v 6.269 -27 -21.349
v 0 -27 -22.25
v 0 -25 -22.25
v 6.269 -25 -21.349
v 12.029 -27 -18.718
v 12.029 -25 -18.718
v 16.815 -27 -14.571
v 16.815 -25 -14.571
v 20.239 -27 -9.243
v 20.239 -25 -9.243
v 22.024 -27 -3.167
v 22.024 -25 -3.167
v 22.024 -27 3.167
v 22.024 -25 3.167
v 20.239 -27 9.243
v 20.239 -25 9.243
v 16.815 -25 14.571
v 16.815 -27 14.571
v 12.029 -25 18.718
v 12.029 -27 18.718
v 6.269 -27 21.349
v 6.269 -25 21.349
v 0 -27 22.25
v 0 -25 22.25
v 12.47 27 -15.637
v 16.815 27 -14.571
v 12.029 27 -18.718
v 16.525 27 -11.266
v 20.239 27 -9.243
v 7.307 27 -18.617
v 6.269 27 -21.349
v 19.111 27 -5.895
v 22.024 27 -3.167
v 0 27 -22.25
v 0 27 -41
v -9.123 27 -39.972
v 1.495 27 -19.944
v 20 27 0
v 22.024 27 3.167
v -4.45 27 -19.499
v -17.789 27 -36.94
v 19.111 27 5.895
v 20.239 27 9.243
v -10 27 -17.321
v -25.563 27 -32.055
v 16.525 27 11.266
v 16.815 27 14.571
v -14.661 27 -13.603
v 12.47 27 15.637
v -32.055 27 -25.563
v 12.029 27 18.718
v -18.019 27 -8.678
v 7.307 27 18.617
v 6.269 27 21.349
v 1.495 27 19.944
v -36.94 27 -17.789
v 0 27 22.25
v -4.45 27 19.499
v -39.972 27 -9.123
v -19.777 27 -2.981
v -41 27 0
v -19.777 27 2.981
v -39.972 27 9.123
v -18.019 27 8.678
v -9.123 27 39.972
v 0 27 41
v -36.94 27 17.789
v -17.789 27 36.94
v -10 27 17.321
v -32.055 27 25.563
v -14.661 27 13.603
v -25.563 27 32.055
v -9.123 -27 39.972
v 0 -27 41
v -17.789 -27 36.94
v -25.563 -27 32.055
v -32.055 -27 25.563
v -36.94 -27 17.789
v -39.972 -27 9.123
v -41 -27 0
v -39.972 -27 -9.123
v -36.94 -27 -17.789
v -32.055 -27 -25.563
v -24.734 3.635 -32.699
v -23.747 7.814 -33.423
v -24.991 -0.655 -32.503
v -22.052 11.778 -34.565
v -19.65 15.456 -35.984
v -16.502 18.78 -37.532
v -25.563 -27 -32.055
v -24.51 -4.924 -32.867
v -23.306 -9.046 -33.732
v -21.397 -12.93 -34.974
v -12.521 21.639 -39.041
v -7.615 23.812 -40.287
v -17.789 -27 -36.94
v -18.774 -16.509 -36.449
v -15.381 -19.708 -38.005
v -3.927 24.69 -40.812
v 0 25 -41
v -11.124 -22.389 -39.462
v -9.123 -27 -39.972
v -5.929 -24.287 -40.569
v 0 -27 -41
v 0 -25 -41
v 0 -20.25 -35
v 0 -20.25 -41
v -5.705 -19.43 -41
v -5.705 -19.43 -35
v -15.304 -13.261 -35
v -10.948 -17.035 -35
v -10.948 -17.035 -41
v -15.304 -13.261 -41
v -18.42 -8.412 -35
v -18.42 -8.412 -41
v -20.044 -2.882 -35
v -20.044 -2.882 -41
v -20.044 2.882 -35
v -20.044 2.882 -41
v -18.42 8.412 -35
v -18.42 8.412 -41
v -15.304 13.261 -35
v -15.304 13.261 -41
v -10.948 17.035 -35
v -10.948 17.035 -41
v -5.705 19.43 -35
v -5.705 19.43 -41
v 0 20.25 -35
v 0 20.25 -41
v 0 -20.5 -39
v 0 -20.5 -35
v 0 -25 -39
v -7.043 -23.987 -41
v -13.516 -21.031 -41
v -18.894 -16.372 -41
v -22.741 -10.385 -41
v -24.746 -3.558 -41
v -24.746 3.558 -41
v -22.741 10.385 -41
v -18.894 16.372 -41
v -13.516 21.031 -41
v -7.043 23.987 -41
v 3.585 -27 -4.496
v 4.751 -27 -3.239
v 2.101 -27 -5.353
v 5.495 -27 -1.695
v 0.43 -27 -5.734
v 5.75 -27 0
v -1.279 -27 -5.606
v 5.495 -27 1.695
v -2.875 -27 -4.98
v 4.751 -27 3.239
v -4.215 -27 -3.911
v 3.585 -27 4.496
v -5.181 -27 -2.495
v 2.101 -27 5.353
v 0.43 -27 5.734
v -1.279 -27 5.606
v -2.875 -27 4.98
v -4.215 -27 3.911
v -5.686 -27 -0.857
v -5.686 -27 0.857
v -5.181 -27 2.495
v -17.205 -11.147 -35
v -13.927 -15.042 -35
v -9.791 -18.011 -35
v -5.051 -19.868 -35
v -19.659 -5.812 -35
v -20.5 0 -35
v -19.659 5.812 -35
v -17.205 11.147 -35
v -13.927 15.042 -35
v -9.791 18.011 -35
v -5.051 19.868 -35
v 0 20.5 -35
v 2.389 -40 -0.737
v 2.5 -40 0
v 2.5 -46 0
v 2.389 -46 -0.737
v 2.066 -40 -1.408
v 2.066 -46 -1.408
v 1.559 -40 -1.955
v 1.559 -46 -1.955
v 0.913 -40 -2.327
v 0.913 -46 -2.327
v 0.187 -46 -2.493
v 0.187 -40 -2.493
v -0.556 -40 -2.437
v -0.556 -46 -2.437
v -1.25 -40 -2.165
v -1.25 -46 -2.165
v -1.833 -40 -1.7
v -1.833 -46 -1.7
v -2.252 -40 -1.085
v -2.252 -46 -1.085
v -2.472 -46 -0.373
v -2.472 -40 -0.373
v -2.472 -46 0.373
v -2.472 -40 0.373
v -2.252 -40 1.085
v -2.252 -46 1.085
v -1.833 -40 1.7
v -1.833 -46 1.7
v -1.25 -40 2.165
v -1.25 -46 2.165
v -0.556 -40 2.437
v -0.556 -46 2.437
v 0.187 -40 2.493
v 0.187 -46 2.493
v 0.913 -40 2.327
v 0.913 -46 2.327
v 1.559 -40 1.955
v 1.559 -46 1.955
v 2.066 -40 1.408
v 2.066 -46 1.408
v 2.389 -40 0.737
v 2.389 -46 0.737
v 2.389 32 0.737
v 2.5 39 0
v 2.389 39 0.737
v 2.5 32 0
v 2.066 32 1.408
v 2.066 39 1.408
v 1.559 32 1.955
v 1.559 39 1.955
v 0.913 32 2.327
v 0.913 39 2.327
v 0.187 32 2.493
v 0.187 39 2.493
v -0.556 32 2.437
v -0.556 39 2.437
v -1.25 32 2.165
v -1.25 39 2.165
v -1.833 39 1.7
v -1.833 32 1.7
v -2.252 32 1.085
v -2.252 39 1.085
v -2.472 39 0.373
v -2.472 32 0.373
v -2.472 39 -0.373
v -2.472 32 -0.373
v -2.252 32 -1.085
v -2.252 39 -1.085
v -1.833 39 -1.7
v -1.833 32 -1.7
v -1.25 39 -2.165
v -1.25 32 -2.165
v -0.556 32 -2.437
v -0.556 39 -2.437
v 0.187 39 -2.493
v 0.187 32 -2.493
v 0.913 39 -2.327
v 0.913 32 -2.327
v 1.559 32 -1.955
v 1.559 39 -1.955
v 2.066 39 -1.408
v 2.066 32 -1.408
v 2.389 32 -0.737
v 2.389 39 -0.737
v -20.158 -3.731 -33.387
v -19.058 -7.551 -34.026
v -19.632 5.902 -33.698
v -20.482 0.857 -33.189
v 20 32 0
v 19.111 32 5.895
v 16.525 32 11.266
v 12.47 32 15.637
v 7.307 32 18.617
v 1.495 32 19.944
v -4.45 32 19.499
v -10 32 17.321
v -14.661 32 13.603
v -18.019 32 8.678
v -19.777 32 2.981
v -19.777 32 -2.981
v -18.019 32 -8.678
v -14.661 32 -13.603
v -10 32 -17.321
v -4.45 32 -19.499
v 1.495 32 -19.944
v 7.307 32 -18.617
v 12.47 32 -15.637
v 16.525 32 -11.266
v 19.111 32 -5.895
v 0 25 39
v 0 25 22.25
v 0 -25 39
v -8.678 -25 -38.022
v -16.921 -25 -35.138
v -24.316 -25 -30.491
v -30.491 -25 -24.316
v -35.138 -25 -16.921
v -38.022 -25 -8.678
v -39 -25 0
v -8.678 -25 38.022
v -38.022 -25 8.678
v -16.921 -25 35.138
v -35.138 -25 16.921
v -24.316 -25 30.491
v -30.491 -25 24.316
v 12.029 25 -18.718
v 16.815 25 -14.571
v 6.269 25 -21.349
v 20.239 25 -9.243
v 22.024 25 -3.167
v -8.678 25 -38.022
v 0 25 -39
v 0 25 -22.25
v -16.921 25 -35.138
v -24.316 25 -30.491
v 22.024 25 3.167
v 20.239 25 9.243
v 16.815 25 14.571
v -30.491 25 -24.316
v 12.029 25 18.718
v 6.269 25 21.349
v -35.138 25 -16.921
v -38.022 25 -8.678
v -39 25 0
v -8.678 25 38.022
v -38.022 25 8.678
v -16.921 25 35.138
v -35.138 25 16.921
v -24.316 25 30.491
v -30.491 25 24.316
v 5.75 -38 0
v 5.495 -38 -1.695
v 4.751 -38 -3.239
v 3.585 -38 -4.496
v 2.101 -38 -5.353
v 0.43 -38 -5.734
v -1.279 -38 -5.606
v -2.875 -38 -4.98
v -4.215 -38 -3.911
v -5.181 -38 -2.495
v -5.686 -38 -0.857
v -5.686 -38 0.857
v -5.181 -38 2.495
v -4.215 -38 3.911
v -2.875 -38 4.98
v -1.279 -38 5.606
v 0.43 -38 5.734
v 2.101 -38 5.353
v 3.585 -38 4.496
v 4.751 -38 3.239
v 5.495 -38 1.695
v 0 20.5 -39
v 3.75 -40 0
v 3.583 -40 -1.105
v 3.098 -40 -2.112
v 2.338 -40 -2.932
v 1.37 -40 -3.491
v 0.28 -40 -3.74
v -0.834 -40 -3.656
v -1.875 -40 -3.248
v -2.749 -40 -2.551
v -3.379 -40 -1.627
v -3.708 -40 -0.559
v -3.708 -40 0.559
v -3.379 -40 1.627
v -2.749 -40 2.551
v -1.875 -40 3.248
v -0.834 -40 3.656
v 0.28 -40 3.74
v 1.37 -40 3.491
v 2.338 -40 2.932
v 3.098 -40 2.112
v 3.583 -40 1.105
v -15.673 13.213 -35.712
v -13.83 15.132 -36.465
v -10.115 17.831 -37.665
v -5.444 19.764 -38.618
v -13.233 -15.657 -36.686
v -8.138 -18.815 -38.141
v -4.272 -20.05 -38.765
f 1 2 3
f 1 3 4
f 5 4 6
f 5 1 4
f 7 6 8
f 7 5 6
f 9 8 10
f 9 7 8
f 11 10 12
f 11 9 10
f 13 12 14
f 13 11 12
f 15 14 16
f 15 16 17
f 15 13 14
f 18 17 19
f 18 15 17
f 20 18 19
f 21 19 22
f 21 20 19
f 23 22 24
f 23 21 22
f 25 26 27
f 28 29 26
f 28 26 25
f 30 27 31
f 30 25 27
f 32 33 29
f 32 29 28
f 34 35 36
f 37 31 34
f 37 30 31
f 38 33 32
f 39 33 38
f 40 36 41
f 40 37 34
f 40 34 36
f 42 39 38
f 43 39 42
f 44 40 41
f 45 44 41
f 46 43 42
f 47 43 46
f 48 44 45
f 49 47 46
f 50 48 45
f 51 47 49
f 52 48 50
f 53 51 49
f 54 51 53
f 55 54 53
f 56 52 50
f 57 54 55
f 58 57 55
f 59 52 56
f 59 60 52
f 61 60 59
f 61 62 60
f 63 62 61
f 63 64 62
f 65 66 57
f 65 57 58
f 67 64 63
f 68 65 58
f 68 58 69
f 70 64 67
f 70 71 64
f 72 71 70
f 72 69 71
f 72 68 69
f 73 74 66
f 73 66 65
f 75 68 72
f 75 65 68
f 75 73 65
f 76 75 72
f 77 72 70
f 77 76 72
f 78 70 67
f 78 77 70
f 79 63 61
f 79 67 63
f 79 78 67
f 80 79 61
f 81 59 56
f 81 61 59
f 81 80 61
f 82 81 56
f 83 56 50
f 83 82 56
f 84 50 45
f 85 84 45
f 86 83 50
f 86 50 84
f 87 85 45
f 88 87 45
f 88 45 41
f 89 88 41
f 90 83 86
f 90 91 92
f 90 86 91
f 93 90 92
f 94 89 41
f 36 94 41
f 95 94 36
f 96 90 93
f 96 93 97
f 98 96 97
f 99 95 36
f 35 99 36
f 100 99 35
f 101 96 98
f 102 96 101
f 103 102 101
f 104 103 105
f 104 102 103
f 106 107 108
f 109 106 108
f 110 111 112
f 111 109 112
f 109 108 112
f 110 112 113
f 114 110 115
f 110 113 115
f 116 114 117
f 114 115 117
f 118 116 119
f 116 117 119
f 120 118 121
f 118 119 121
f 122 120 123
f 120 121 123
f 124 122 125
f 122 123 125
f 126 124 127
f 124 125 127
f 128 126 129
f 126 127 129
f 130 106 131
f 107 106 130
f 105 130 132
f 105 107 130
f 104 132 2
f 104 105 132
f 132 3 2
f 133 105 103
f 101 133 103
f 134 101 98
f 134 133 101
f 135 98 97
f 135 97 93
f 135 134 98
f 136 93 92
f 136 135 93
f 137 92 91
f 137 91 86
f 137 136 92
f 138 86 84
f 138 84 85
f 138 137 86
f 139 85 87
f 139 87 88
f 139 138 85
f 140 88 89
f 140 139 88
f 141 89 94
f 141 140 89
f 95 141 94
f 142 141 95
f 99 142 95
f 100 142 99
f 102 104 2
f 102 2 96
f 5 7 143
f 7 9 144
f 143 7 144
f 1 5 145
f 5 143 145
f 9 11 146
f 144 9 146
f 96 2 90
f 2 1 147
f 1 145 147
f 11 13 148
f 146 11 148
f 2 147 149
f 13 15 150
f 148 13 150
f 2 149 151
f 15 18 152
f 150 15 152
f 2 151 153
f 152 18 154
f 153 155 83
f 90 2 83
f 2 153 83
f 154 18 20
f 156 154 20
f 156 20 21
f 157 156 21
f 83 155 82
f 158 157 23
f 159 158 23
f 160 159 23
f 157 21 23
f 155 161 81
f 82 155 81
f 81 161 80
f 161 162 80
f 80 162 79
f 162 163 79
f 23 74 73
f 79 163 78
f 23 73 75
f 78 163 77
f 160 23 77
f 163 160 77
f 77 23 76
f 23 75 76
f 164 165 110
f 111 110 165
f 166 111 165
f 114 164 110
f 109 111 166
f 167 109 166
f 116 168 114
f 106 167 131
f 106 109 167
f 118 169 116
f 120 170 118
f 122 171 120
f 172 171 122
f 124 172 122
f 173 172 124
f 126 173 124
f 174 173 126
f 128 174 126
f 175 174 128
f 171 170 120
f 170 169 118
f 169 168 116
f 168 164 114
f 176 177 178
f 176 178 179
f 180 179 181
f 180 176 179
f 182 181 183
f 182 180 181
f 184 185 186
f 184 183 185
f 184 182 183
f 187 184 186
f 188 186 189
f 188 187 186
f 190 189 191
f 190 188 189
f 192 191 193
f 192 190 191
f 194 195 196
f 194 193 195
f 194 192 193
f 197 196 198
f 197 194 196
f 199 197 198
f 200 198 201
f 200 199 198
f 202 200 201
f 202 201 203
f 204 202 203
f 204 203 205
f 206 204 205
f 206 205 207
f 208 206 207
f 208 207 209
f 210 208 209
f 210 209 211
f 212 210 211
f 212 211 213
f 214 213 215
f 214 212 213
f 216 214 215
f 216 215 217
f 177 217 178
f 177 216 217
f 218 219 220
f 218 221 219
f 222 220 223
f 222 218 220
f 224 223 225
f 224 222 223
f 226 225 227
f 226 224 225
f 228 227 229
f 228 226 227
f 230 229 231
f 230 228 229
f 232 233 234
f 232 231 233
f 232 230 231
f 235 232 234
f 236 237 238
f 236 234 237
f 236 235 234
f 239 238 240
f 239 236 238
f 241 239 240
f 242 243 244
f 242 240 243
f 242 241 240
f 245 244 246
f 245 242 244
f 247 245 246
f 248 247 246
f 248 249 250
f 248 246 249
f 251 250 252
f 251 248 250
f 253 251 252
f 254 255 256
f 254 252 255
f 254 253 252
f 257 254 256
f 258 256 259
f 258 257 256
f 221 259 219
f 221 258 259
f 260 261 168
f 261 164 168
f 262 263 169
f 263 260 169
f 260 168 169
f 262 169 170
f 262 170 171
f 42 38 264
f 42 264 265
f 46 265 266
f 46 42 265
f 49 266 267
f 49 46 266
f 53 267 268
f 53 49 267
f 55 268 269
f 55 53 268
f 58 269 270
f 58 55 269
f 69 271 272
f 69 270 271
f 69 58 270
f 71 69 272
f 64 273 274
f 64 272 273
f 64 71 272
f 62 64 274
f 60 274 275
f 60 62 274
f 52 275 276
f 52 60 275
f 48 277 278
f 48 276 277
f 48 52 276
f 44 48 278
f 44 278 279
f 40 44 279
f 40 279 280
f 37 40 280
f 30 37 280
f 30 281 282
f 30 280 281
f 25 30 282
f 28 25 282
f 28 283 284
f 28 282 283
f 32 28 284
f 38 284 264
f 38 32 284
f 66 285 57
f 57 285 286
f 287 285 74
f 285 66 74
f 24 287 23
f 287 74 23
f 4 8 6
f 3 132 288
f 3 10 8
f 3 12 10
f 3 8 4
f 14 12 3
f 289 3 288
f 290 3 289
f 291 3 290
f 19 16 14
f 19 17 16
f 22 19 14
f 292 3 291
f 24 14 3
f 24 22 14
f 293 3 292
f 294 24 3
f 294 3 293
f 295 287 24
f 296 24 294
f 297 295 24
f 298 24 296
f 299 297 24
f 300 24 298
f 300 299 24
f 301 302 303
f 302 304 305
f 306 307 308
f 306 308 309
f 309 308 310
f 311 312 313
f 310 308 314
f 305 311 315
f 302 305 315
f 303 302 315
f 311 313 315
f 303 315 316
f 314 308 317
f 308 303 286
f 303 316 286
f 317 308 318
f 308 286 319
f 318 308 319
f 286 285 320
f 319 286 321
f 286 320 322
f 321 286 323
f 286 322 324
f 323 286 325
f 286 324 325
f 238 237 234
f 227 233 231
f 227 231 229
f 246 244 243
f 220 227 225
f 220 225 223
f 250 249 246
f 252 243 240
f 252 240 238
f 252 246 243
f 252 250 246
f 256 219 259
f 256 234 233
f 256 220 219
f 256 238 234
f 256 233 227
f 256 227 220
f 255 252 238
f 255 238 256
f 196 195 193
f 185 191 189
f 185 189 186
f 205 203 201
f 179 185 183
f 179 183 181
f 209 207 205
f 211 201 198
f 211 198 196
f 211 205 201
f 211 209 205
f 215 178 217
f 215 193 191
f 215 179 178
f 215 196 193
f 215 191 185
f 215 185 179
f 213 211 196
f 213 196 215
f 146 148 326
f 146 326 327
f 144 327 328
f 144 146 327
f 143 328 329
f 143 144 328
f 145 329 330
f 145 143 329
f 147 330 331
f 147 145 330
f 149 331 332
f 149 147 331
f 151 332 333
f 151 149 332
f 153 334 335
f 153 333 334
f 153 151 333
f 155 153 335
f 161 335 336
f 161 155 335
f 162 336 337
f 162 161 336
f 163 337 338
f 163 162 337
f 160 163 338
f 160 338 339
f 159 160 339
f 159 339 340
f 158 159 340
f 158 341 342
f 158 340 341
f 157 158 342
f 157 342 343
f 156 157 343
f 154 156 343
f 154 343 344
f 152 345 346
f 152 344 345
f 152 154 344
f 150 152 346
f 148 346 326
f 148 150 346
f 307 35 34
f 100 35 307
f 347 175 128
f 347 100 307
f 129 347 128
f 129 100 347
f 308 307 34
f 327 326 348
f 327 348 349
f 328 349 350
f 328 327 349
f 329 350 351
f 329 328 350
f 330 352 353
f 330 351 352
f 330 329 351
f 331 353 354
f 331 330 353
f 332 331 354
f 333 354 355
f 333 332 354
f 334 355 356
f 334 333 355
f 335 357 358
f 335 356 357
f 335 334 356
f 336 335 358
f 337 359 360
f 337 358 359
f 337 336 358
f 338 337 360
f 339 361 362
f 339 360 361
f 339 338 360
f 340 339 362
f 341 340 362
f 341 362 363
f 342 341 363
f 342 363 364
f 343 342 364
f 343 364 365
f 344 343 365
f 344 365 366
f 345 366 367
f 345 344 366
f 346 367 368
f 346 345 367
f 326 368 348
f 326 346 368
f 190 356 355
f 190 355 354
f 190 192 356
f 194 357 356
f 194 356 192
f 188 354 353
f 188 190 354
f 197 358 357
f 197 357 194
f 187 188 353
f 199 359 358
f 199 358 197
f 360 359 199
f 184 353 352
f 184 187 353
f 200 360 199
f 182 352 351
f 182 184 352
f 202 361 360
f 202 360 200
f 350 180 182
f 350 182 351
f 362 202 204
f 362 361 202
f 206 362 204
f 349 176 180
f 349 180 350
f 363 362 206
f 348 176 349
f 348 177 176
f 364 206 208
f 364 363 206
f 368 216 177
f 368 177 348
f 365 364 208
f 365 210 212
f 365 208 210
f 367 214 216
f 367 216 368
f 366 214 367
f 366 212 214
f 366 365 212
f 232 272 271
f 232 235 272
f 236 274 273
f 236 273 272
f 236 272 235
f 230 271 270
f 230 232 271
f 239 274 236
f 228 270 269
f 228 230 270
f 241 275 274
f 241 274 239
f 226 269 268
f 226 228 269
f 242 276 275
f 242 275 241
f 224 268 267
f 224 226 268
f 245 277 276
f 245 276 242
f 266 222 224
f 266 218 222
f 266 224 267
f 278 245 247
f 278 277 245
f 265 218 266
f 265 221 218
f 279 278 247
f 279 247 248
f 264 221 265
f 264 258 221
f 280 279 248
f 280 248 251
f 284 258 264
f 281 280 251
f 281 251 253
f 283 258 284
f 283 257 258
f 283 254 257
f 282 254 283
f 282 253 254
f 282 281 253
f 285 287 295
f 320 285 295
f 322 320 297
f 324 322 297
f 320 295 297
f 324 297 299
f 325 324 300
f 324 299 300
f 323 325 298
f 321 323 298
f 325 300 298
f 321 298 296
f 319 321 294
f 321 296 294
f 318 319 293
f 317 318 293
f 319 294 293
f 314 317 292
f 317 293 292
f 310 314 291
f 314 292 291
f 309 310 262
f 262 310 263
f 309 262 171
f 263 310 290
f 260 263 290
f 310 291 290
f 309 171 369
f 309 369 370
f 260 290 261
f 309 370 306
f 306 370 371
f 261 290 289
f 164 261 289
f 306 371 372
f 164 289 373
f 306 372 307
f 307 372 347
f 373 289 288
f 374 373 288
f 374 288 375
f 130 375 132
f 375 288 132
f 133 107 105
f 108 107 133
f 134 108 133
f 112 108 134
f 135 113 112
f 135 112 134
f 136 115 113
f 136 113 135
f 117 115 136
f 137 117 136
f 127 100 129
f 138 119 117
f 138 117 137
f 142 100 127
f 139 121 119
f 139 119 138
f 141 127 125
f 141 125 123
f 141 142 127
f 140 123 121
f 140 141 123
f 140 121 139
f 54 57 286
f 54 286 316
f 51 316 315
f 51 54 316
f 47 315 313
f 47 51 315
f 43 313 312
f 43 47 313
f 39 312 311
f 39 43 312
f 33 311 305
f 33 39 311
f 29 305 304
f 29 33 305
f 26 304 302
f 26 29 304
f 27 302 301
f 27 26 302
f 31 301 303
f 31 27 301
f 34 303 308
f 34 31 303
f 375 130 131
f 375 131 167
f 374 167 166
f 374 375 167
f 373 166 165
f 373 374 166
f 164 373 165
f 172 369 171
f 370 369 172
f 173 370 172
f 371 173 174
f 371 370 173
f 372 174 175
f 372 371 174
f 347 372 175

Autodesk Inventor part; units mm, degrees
ref_plane "YZ Plane" through (0, 0, 0) normal (1, 0, 0) x (0, 1, 0)
sketch "스케치1" plane through (0, 0, 0) normal (0, 1, 0) x (-1, 0, 0)
  arc A0 (0, -41) -> (0, 41) centre (0, 0) ccw
  line L0 (0, 41) -> (0, -41)
  dimension "d0" = 82
extrude "돌출1" add sketch "스케치1" along normal mid plane 54
shell "쉘1" thickness 2 removed faces 1 at (0, 9, -13.6667)
sketch "스케치3" plane through (0, 27, 0) normal (0, 1, 0) x (1, 0, 0)
  circle A0 centre (0, 0) radius 22.25
  line L0 (0, 41) -> (0, -41) projected
  line L1 (0, -22.25) -> (0, 22.25)
  dimension "d4" = 44.5
extrude "돌출2" add sketch "스케치3" against normal blind 2 contours A0 L0 picked at (7.4489, 4.8102)
mirror "미러1" about plane through (0, 0, 0) normal (0, 1, 0) of "돌출2"
sketch "스케치4" plane through (0, 27, 0) normal (0, 1, 0) x (1, 0, 0)
  circle A0 centre (0, 0) radius 20
  dimension "d7" = 40
extrude "돌출3" add sketch "스케치4" along normal blind 5
sketch "스케치5" plane through (0, 32, 0) normal (0, 1, 0) x (1, 0, 0)
  circle A0 centre (0, 0) radius 2.5
  dimension "d10" = 5
extrude "돌출4" add sketch "스케치5" along normal blind 7
sketch "스케치6" plane through (0, -27, 0) normal (0, -1, 0) x (1, 0, 0)
  circle A0 centre (0, 0) radius 5.75
  dimension "d13" = 11.5
extrude "돌출5" add sketch "스케치6" along normal blind 13
sketch "스케치7" plane through (0, -40, 0) normal (0, -1, 0) x (1, 0, 0)
  circle A0 centre (0, 0) radius 2.5
  dimension "d16" = 5
extrude "돌출6" add sketch "스케치7" along normal blind 6
chamfer "모따기1" distance 2 angle 45 1 edges at (-5.75, -40, 0)
ref_plane "작업 평면1" through (0, 0, -41) normal (0, 0, 1) x (1, 0, 0)
sketch "스케치8" plane through (0, 0, -41) normal (0, 0, 1) x (1, 0, 0)
  circle A0 centre (0, 0) radius 20.5
  dimension "d23" = 41
extrude "돌출7" cut sketch "스케치8" along normal up to surface
ref_plane "작업 평면2" through (0, 0, -41) normal (0, 0, 1) x (1, 0, 0)
sketch "스케치9" plane through (0, 0, -41) normal (0, 0, 1) x (1, 0, 0)
  circle A0 centre (0, 0) radius 20.5
  line L0 (0, 25) -> (0, 20.5) projected
  line L1 (0, 20.5) -> (0, -20.5)
  dimension "d27" = 41
extrude "돌출8" add sketch "스케치9" along normal blind 6 contours L1 A0 picked at (-6.7835, -0.8237)
sketch "스케치10" plane through (0, 0, -41) normal (0, 0, -1) x (-1, 0, 0)
  circle A0 centre (0, 0) radius 20.25
  dimension "d30" = 40.5
extrude "돌출9" cut sketch "스케치10" against normal blind 10
sketch "스케치11" plane through (0, 0, -41) normal (0, 0, -1) x (-1, 0, 0)
  arc A0 (0, -25) -> (0, 25) centre (0, 0) ccw
  line L0 (0, 25) -> (0, 20.25)
  line L1 (0, -20.25) -> (0, -25)
  arc A1 (0, -20.25) -> (0, 20.25) centre (0, 0) ccw
extrude "돌출10" add sketch "스케치11" against normal up to surface
properties part number "헤드(상)"
